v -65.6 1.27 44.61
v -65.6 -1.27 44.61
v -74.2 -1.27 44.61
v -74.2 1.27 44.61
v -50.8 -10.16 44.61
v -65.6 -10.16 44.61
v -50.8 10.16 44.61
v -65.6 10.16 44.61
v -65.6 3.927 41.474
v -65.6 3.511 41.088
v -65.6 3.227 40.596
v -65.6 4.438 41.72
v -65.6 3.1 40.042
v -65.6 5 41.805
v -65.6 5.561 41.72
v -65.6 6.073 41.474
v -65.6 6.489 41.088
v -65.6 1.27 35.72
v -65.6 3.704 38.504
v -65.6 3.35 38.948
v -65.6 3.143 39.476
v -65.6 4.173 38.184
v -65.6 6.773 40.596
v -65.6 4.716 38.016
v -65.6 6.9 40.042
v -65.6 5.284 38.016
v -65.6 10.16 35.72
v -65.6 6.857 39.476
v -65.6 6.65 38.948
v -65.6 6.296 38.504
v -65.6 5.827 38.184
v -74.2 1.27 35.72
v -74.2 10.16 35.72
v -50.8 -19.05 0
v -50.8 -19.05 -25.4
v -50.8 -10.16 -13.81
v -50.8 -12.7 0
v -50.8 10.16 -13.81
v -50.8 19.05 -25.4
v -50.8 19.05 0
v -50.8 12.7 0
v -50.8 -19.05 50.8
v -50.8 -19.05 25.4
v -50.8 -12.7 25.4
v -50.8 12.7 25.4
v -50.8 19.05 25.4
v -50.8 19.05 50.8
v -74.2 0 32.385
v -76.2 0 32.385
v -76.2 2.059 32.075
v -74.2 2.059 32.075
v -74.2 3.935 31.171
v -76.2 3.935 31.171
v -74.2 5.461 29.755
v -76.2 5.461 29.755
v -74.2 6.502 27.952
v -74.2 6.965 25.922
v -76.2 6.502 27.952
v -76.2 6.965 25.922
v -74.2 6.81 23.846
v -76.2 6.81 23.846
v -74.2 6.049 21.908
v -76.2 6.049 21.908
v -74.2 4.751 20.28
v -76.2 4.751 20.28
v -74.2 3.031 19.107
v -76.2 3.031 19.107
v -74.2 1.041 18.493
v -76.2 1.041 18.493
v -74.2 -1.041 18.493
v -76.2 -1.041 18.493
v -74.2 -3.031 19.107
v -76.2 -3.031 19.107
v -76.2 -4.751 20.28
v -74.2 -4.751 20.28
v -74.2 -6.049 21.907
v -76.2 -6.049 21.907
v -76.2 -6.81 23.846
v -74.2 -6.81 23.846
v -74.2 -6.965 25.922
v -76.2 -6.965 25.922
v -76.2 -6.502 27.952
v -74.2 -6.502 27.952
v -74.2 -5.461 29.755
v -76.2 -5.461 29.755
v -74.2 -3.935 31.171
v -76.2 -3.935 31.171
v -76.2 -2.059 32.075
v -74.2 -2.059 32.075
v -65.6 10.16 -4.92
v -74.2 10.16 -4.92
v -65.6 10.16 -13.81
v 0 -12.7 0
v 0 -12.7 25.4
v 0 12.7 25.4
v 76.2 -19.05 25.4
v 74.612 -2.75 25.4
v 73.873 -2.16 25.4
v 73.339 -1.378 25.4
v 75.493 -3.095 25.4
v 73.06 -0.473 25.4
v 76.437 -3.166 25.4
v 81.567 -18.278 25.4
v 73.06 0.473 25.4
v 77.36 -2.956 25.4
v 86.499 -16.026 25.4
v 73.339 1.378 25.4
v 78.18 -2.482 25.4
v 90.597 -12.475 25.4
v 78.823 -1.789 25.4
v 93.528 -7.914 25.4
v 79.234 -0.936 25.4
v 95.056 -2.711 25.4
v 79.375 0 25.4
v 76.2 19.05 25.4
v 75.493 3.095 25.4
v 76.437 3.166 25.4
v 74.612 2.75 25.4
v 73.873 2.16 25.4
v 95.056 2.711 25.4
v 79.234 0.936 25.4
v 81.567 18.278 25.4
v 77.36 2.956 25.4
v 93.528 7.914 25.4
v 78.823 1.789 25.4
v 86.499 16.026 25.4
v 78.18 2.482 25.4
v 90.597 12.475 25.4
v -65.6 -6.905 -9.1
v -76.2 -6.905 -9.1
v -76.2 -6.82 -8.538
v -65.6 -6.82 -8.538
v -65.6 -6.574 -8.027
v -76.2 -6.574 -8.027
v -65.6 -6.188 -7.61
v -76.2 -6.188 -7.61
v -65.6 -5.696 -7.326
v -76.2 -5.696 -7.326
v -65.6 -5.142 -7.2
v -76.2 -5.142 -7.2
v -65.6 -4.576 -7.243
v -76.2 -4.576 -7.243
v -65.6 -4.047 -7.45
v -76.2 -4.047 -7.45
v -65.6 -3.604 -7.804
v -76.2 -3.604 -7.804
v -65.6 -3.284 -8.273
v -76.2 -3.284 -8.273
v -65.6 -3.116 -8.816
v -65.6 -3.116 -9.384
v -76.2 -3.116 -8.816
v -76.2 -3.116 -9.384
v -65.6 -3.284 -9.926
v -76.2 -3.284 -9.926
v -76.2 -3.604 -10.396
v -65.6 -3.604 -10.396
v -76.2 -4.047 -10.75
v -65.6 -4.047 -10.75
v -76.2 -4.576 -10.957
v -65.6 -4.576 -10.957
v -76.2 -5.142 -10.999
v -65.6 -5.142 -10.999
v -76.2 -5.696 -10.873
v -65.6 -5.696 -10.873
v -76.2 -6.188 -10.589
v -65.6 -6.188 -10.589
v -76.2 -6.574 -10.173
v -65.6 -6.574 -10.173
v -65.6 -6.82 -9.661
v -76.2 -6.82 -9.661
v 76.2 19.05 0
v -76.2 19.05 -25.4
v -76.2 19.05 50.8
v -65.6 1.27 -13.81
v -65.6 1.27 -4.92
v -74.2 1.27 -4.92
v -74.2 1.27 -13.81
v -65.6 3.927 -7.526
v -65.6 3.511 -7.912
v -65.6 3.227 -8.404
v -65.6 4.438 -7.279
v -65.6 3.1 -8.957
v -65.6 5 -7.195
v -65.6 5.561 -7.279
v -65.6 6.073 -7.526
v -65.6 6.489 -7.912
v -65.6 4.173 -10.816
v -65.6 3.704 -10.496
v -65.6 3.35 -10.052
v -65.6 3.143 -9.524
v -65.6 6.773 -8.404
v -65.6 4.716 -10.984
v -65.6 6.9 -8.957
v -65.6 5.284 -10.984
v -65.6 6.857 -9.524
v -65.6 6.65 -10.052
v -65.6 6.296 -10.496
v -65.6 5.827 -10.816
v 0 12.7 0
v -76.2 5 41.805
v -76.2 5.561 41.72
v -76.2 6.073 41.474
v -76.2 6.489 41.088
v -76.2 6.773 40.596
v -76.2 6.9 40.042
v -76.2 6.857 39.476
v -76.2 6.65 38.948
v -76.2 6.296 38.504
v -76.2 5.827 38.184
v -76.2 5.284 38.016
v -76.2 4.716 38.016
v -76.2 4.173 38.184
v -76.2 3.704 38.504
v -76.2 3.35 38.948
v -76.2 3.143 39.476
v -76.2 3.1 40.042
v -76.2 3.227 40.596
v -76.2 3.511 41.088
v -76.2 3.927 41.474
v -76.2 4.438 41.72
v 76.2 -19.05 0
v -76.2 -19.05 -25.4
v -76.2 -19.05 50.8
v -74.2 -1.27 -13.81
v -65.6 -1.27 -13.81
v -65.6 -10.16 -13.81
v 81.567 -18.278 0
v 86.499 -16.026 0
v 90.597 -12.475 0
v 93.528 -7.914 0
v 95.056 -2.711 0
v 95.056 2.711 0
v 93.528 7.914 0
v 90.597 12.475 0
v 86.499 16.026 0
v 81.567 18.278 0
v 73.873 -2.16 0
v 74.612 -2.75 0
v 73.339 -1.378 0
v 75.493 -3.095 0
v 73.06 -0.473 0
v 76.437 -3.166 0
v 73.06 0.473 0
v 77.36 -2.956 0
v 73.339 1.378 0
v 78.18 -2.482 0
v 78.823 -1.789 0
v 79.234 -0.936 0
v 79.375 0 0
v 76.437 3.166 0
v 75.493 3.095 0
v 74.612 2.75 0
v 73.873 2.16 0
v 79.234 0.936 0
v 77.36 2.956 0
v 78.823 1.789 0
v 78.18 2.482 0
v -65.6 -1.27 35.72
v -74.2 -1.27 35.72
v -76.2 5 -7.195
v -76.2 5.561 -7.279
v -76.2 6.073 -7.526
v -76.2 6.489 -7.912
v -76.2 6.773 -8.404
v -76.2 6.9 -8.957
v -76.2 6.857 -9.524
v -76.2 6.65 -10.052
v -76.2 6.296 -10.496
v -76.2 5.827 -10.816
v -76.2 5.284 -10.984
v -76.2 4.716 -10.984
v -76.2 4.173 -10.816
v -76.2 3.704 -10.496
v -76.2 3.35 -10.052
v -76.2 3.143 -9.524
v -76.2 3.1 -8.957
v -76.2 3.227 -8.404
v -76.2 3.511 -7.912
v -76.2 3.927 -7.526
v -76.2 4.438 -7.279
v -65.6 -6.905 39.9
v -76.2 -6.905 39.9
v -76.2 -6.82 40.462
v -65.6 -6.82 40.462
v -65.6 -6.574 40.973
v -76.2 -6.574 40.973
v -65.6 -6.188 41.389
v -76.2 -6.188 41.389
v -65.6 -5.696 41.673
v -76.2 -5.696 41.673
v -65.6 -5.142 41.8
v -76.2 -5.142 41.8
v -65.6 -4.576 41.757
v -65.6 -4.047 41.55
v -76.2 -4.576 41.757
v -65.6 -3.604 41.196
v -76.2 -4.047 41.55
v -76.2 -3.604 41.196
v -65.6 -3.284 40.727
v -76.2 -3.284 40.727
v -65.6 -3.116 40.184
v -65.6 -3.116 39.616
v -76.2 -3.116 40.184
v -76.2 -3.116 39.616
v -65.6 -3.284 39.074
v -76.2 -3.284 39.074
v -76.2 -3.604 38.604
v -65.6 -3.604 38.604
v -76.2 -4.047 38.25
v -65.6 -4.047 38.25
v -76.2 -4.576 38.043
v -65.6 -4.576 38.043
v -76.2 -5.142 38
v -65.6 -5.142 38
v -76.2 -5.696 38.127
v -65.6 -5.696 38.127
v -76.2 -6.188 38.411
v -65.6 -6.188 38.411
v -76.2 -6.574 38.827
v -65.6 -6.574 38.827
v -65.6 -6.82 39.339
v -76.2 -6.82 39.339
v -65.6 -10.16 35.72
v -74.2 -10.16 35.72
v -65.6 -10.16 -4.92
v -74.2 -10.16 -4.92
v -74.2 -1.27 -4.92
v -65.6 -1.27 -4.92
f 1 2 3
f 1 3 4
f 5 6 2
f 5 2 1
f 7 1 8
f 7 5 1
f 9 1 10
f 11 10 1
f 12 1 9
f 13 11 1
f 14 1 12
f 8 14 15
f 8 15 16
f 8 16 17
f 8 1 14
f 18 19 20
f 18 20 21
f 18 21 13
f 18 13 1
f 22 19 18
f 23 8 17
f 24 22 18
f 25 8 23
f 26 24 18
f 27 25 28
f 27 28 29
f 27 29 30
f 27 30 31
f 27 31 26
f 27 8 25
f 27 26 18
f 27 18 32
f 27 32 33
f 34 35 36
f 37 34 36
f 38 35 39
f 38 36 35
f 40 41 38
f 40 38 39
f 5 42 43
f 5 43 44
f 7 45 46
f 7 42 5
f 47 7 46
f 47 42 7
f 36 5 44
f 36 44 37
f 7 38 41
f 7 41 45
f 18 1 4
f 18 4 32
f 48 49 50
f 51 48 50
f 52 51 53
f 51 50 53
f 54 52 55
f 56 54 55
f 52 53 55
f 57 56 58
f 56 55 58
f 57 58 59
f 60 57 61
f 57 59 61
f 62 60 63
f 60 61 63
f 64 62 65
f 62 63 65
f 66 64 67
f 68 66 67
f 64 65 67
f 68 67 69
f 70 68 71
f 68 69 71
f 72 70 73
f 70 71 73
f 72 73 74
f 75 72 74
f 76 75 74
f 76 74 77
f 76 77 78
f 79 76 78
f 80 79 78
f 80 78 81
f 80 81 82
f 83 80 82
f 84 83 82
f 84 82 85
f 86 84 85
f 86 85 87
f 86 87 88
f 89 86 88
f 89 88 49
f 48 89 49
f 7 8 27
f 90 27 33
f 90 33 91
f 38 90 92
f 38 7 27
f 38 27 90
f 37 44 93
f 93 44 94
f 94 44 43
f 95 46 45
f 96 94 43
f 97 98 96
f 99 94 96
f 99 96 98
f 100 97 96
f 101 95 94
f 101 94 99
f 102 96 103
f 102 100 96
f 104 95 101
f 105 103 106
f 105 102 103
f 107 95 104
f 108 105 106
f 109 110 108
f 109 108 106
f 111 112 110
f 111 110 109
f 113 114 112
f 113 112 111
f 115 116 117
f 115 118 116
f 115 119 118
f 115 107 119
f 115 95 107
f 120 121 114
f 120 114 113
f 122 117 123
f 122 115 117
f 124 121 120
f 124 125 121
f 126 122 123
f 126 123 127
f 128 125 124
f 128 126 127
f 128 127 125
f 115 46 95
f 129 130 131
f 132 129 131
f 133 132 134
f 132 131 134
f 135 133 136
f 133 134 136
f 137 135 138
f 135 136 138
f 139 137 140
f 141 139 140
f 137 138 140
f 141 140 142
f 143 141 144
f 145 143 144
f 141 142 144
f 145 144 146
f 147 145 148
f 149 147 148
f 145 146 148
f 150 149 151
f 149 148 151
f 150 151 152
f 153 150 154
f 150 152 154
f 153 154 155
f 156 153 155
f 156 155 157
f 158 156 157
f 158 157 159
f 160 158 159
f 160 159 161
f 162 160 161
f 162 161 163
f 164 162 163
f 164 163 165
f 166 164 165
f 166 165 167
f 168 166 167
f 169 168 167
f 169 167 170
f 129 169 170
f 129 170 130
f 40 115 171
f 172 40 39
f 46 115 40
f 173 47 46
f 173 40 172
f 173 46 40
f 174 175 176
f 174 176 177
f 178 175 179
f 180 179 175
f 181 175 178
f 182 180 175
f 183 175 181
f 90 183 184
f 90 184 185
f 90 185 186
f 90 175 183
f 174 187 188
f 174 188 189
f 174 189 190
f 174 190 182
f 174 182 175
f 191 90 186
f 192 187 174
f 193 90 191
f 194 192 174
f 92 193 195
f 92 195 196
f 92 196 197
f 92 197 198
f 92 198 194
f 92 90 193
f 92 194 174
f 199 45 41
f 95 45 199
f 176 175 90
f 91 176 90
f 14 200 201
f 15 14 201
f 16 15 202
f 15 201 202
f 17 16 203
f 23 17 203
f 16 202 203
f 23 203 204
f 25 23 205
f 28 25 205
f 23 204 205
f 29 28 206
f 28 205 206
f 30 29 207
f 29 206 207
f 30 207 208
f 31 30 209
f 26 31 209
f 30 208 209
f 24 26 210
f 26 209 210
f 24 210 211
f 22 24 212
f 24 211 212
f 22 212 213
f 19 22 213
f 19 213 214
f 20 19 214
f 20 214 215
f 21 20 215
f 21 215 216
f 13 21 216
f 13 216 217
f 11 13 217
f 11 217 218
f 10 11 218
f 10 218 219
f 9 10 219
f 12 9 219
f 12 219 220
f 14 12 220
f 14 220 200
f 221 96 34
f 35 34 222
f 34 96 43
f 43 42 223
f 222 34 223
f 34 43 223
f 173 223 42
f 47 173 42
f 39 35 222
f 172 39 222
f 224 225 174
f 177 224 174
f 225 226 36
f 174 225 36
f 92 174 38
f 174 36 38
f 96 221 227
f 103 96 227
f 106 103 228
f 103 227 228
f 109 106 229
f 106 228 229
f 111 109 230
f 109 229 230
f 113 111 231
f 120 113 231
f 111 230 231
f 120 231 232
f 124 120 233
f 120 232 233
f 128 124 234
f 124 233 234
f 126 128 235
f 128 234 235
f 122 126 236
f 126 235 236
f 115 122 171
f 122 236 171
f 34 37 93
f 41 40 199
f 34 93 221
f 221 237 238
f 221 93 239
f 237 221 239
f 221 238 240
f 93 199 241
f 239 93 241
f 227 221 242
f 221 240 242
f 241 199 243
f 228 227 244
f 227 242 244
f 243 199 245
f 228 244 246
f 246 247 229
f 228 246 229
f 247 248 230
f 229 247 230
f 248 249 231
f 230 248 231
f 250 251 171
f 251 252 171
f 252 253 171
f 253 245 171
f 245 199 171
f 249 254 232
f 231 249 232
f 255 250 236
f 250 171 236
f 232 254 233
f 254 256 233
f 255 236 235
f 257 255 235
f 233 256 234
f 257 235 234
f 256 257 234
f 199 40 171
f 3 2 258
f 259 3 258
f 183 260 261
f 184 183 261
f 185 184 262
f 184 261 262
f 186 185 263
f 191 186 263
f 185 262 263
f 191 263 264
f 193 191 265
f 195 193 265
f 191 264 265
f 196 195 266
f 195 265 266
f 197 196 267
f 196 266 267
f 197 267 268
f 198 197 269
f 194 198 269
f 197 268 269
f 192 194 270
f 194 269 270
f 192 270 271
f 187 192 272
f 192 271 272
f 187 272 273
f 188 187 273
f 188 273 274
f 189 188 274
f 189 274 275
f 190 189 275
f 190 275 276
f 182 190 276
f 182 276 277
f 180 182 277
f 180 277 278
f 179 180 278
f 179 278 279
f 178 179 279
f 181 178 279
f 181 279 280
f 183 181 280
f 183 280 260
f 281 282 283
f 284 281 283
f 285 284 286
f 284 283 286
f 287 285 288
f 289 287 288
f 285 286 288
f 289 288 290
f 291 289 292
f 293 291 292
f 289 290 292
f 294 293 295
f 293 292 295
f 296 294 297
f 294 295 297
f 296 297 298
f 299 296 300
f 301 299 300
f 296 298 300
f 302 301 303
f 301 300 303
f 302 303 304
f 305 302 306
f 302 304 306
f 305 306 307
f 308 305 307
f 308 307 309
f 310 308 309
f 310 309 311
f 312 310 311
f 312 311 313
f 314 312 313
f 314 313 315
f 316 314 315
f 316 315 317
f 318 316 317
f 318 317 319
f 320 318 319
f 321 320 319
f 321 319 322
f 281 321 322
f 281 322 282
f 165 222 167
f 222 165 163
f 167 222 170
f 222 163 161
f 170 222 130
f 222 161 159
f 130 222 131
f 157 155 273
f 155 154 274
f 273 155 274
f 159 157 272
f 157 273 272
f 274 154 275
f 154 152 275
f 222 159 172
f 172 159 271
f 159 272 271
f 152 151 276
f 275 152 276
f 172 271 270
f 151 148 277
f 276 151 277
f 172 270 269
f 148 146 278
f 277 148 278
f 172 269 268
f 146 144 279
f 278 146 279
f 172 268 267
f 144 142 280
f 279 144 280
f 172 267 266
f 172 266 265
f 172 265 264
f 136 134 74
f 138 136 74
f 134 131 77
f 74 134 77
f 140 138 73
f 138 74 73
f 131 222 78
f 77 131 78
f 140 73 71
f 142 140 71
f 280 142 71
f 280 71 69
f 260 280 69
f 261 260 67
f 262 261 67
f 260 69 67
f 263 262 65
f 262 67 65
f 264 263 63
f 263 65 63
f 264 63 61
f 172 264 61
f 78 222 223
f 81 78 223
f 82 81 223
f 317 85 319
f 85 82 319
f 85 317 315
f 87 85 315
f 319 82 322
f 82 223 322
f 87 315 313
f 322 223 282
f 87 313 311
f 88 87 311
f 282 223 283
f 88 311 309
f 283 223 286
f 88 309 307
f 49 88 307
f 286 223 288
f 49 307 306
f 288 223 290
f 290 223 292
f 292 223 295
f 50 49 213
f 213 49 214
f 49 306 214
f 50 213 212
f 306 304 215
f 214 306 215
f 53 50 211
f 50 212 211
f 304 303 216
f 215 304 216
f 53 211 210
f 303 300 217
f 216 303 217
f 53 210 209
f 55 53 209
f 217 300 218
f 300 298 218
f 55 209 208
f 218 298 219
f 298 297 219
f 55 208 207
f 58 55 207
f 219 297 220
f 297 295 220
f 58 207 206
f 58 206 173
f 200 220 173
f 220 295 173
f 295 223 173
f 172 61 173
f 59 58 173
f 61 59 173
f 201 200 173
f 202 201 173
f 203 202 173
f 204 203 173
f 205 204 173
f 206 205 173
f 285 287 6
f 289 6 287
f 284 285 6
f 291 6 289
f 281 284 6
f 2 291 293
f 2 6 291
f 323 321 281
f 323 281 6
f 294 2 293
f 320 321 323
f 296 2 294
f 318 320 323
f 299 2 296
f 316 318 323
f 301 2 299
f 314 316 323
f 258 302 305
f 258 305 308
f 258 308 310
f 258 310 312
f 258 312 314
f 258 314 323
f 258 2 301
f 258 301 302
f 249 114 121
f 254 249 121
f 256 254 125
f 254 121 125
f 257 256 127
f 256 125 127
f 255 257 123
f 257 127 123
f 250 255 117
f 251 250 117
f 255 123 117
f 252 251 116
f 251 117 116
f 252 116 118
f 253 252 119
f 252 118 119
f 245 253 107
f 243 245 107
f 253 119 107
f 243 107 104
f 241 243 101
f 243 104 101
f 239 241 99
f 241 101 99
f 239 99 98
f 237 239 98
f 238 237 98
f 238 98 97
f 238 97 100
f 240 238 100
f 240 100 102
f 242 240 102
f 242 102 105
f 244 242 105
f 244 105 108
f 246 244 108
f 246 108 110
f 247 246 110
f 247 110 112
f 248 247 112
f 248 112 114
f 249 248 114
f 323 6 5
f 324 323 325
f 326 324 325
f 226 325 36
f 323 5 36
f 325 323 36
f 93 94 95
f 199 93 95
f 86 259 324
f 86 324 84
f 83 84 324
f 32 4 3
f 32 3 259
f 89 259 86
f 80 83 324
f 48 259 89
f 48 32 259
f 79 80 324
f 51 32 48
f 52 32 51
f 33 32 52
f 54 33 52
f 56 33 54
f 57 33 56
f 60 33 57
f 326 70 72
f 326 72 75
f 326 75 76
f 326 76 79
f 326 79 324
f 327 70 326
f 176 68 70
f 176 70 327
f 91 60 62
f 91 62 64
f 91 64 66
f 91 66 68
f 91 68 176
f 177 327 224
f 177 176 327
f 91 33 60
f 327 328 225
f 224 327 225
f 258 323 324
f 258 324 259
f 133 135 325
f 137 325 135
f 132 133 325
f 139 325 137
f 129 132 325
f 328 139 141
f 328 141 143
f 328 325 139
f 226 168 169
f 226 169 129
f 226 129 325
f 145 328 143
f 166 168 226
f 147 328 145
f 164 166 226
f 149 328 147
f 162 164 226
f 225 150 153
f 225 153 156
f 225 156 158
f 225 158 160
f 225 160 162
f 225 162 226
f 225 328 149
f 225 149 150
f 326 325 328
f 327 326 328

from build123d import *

# Parameters (mm, degrees)
SKETCH1_R           = 19.05
SKETCH1_W           = 152.4
SKETCH1_H           = 38.1
BOSS_EXTRUDE1_DEPTH = 25.4
SKETCH4_W           = 25.4
SKETCH4_H           = 38.1
BOSS_EXTRUDE3_DEPTH = 25.4
SKETCH6_W           = 25.4
SKETCH6_H           = 38.1
BOSS_EXTRUDE4_DEPTH = 25.4
SKETCH5_R           = 6.985
SKETCH5_R_2         = 1.905
CUT_EXTRUDE1_DEPTH  = 25.4
SKETCH7_W           = 50.8
SKETCH7_H           = 25.4
CUT_EXTRUDE2_DEPTH  = 25.4
SKETCH8_W           = 40.64
SKETCH8_H           = 20.32
CUT_EXTRUDE3_DEPTH  = 23.400004
SKETCH9_W           = 8.89
SKETCH9_H           = 20.32
CUT_EXTRUDE4_DEPTH  = 14.800072
SKETCH10_W          = 8.89
SKETCH10_H          = 2.54
CUT_EXTRUDE5_DEPTH  = 8.599932
SKETCH11_R          = 3.175
CUT_EXTRUDE6_DEPTH  = 110.617995785


with BuildPart() as part:
    # Sketch1 → Boss-Extrude1 (new body)
    with BuildSketch(Plane.XY):
        with Locations((76.2, 0)):
            Circle(SKETCH1_R)
        Rectangle(SKETCH1_W, SKETCH1_H)
    extrude(amount=BOSS_EXTRUDE1_DEPTH)

    # Sketch4 → Boss-Extrude3 (add)
    with BuildSketch(Plane.XY.offset(25.4)):
        with Locations((-63.5, 0)):
            Rectangle(SKETCH4_W, SKETCH4_H)
    extrude(amount=BOSS_EXTRUDE3_DEPTH)

    # Sketch6 → Boss-Extrude4 (add)
    with BuildSketch(Plane(origin=(0, 0, 0), x_dir=(-1, 0, 0), z_dir=(0, 0, -1))):
        with Locations((63.5, 0)):
            Rectangle(SKETCH6_W, SKETCH6_H)
    extrude(amount=BOSS_EXTRUDE4_DEPTH)

    # Sketch5 → Cut-Extrude1 (cut)
    with BuildSketch(Plane.ZY.offset(76.2)):
        with Locations((25.4, 0)):
            Circle(SKETCH5_R)
        with Locations((39.900098, 4.99999)):
            Circle(SKETCH5_R_2)
        with Locations((-9.099804, 4.99999)):
            Circle(SKETCH5_R_2)
        with Locations(Location((-9.099804, -4.99999, 0), (0, 0, 270))):
            Circle(SKETCH5_R_2)
        with Locations(Location((39.900098, -4.99999, 0), (0, 0, 270))):
            Circle(SKETCH5_R_2)
    extrude(amount=-CUT_EXTRUDE1_DEPTH, mode=Mode.SUBTRACT)

    # Sketch7 → Cut-Extrude2 (cut)
    with BuildSketch(Plane.XY.offset(25.4)):
        with Locations((-25.4, 0)):
            Rectangle(SKETCH7_W, SKETCH7_H)
    extrude(amount=-CUT_EXTRUDE2_DEPTH, mode=Mode.SUBTRACT)

    # Sketch8 → Cut-Extrude3 (cut)
    with BuildSketch(Plane(origin=(-50.8, 0, 0), x_dir=(0, 0, -1), z_dir=(1, 0, 0))):
        with Locations((-15.400147, 0)):
            Rectangle(SKETCH8_W, SKETCH8_H)
    extrude(amount=-CUT_EXTRUDE3_DEPTH, mode=Mode.SUBTRACT)

    # Sketch9 → Cut-Extrude4 (cut)
    with BuildSketch(Plane(origin=(-50.8, 0, 0), x_dir=(0, 0, -1), z_dir=(1, 0, 0))):
        with Locations((-40.165147, 0)):
            Rectangle(SKETCH9_W, SKETCH9_H)
        with Locations((9.364853, 0)):
            Rectangle(SKETCH9_W, SKETCH9_H)
    extrude(amount=-CUT_EXTRUDE4_DEPTH, mode=Mode.SUBTRACT)

    # Sketch10 → Cut-Extrude5 (cut)
    with BuildSketch(Plane(origin=(-65.600072, 0, 0), x_dir=(0, 0, -1), z_dir=(1, 0, 0))):
        with Locations((-40.165147, 0)):
            Rectangle(SKETCH10_W, SKETCH10_H)
        with Locations((9.364853, 0)):
            Rectangle(SKETCH10_W, SKETCH10_H)
    extrude(amount=-CUT_EXTRUDE5_DEPTH, mode=Mode.SUBTRACT)

    # Sketch11 → Cut-Extrude6 (cut, through all)
    with BuildSketch(Plane.XY.offset(25.4)):
        with Locations((76.2, 0)):
            Circle(SKETCH11_R)
    extrude(amount=-CUT_EXTRUDE6_DEPTH, mode=Mode.SUBTRACT)


solid = part.part
